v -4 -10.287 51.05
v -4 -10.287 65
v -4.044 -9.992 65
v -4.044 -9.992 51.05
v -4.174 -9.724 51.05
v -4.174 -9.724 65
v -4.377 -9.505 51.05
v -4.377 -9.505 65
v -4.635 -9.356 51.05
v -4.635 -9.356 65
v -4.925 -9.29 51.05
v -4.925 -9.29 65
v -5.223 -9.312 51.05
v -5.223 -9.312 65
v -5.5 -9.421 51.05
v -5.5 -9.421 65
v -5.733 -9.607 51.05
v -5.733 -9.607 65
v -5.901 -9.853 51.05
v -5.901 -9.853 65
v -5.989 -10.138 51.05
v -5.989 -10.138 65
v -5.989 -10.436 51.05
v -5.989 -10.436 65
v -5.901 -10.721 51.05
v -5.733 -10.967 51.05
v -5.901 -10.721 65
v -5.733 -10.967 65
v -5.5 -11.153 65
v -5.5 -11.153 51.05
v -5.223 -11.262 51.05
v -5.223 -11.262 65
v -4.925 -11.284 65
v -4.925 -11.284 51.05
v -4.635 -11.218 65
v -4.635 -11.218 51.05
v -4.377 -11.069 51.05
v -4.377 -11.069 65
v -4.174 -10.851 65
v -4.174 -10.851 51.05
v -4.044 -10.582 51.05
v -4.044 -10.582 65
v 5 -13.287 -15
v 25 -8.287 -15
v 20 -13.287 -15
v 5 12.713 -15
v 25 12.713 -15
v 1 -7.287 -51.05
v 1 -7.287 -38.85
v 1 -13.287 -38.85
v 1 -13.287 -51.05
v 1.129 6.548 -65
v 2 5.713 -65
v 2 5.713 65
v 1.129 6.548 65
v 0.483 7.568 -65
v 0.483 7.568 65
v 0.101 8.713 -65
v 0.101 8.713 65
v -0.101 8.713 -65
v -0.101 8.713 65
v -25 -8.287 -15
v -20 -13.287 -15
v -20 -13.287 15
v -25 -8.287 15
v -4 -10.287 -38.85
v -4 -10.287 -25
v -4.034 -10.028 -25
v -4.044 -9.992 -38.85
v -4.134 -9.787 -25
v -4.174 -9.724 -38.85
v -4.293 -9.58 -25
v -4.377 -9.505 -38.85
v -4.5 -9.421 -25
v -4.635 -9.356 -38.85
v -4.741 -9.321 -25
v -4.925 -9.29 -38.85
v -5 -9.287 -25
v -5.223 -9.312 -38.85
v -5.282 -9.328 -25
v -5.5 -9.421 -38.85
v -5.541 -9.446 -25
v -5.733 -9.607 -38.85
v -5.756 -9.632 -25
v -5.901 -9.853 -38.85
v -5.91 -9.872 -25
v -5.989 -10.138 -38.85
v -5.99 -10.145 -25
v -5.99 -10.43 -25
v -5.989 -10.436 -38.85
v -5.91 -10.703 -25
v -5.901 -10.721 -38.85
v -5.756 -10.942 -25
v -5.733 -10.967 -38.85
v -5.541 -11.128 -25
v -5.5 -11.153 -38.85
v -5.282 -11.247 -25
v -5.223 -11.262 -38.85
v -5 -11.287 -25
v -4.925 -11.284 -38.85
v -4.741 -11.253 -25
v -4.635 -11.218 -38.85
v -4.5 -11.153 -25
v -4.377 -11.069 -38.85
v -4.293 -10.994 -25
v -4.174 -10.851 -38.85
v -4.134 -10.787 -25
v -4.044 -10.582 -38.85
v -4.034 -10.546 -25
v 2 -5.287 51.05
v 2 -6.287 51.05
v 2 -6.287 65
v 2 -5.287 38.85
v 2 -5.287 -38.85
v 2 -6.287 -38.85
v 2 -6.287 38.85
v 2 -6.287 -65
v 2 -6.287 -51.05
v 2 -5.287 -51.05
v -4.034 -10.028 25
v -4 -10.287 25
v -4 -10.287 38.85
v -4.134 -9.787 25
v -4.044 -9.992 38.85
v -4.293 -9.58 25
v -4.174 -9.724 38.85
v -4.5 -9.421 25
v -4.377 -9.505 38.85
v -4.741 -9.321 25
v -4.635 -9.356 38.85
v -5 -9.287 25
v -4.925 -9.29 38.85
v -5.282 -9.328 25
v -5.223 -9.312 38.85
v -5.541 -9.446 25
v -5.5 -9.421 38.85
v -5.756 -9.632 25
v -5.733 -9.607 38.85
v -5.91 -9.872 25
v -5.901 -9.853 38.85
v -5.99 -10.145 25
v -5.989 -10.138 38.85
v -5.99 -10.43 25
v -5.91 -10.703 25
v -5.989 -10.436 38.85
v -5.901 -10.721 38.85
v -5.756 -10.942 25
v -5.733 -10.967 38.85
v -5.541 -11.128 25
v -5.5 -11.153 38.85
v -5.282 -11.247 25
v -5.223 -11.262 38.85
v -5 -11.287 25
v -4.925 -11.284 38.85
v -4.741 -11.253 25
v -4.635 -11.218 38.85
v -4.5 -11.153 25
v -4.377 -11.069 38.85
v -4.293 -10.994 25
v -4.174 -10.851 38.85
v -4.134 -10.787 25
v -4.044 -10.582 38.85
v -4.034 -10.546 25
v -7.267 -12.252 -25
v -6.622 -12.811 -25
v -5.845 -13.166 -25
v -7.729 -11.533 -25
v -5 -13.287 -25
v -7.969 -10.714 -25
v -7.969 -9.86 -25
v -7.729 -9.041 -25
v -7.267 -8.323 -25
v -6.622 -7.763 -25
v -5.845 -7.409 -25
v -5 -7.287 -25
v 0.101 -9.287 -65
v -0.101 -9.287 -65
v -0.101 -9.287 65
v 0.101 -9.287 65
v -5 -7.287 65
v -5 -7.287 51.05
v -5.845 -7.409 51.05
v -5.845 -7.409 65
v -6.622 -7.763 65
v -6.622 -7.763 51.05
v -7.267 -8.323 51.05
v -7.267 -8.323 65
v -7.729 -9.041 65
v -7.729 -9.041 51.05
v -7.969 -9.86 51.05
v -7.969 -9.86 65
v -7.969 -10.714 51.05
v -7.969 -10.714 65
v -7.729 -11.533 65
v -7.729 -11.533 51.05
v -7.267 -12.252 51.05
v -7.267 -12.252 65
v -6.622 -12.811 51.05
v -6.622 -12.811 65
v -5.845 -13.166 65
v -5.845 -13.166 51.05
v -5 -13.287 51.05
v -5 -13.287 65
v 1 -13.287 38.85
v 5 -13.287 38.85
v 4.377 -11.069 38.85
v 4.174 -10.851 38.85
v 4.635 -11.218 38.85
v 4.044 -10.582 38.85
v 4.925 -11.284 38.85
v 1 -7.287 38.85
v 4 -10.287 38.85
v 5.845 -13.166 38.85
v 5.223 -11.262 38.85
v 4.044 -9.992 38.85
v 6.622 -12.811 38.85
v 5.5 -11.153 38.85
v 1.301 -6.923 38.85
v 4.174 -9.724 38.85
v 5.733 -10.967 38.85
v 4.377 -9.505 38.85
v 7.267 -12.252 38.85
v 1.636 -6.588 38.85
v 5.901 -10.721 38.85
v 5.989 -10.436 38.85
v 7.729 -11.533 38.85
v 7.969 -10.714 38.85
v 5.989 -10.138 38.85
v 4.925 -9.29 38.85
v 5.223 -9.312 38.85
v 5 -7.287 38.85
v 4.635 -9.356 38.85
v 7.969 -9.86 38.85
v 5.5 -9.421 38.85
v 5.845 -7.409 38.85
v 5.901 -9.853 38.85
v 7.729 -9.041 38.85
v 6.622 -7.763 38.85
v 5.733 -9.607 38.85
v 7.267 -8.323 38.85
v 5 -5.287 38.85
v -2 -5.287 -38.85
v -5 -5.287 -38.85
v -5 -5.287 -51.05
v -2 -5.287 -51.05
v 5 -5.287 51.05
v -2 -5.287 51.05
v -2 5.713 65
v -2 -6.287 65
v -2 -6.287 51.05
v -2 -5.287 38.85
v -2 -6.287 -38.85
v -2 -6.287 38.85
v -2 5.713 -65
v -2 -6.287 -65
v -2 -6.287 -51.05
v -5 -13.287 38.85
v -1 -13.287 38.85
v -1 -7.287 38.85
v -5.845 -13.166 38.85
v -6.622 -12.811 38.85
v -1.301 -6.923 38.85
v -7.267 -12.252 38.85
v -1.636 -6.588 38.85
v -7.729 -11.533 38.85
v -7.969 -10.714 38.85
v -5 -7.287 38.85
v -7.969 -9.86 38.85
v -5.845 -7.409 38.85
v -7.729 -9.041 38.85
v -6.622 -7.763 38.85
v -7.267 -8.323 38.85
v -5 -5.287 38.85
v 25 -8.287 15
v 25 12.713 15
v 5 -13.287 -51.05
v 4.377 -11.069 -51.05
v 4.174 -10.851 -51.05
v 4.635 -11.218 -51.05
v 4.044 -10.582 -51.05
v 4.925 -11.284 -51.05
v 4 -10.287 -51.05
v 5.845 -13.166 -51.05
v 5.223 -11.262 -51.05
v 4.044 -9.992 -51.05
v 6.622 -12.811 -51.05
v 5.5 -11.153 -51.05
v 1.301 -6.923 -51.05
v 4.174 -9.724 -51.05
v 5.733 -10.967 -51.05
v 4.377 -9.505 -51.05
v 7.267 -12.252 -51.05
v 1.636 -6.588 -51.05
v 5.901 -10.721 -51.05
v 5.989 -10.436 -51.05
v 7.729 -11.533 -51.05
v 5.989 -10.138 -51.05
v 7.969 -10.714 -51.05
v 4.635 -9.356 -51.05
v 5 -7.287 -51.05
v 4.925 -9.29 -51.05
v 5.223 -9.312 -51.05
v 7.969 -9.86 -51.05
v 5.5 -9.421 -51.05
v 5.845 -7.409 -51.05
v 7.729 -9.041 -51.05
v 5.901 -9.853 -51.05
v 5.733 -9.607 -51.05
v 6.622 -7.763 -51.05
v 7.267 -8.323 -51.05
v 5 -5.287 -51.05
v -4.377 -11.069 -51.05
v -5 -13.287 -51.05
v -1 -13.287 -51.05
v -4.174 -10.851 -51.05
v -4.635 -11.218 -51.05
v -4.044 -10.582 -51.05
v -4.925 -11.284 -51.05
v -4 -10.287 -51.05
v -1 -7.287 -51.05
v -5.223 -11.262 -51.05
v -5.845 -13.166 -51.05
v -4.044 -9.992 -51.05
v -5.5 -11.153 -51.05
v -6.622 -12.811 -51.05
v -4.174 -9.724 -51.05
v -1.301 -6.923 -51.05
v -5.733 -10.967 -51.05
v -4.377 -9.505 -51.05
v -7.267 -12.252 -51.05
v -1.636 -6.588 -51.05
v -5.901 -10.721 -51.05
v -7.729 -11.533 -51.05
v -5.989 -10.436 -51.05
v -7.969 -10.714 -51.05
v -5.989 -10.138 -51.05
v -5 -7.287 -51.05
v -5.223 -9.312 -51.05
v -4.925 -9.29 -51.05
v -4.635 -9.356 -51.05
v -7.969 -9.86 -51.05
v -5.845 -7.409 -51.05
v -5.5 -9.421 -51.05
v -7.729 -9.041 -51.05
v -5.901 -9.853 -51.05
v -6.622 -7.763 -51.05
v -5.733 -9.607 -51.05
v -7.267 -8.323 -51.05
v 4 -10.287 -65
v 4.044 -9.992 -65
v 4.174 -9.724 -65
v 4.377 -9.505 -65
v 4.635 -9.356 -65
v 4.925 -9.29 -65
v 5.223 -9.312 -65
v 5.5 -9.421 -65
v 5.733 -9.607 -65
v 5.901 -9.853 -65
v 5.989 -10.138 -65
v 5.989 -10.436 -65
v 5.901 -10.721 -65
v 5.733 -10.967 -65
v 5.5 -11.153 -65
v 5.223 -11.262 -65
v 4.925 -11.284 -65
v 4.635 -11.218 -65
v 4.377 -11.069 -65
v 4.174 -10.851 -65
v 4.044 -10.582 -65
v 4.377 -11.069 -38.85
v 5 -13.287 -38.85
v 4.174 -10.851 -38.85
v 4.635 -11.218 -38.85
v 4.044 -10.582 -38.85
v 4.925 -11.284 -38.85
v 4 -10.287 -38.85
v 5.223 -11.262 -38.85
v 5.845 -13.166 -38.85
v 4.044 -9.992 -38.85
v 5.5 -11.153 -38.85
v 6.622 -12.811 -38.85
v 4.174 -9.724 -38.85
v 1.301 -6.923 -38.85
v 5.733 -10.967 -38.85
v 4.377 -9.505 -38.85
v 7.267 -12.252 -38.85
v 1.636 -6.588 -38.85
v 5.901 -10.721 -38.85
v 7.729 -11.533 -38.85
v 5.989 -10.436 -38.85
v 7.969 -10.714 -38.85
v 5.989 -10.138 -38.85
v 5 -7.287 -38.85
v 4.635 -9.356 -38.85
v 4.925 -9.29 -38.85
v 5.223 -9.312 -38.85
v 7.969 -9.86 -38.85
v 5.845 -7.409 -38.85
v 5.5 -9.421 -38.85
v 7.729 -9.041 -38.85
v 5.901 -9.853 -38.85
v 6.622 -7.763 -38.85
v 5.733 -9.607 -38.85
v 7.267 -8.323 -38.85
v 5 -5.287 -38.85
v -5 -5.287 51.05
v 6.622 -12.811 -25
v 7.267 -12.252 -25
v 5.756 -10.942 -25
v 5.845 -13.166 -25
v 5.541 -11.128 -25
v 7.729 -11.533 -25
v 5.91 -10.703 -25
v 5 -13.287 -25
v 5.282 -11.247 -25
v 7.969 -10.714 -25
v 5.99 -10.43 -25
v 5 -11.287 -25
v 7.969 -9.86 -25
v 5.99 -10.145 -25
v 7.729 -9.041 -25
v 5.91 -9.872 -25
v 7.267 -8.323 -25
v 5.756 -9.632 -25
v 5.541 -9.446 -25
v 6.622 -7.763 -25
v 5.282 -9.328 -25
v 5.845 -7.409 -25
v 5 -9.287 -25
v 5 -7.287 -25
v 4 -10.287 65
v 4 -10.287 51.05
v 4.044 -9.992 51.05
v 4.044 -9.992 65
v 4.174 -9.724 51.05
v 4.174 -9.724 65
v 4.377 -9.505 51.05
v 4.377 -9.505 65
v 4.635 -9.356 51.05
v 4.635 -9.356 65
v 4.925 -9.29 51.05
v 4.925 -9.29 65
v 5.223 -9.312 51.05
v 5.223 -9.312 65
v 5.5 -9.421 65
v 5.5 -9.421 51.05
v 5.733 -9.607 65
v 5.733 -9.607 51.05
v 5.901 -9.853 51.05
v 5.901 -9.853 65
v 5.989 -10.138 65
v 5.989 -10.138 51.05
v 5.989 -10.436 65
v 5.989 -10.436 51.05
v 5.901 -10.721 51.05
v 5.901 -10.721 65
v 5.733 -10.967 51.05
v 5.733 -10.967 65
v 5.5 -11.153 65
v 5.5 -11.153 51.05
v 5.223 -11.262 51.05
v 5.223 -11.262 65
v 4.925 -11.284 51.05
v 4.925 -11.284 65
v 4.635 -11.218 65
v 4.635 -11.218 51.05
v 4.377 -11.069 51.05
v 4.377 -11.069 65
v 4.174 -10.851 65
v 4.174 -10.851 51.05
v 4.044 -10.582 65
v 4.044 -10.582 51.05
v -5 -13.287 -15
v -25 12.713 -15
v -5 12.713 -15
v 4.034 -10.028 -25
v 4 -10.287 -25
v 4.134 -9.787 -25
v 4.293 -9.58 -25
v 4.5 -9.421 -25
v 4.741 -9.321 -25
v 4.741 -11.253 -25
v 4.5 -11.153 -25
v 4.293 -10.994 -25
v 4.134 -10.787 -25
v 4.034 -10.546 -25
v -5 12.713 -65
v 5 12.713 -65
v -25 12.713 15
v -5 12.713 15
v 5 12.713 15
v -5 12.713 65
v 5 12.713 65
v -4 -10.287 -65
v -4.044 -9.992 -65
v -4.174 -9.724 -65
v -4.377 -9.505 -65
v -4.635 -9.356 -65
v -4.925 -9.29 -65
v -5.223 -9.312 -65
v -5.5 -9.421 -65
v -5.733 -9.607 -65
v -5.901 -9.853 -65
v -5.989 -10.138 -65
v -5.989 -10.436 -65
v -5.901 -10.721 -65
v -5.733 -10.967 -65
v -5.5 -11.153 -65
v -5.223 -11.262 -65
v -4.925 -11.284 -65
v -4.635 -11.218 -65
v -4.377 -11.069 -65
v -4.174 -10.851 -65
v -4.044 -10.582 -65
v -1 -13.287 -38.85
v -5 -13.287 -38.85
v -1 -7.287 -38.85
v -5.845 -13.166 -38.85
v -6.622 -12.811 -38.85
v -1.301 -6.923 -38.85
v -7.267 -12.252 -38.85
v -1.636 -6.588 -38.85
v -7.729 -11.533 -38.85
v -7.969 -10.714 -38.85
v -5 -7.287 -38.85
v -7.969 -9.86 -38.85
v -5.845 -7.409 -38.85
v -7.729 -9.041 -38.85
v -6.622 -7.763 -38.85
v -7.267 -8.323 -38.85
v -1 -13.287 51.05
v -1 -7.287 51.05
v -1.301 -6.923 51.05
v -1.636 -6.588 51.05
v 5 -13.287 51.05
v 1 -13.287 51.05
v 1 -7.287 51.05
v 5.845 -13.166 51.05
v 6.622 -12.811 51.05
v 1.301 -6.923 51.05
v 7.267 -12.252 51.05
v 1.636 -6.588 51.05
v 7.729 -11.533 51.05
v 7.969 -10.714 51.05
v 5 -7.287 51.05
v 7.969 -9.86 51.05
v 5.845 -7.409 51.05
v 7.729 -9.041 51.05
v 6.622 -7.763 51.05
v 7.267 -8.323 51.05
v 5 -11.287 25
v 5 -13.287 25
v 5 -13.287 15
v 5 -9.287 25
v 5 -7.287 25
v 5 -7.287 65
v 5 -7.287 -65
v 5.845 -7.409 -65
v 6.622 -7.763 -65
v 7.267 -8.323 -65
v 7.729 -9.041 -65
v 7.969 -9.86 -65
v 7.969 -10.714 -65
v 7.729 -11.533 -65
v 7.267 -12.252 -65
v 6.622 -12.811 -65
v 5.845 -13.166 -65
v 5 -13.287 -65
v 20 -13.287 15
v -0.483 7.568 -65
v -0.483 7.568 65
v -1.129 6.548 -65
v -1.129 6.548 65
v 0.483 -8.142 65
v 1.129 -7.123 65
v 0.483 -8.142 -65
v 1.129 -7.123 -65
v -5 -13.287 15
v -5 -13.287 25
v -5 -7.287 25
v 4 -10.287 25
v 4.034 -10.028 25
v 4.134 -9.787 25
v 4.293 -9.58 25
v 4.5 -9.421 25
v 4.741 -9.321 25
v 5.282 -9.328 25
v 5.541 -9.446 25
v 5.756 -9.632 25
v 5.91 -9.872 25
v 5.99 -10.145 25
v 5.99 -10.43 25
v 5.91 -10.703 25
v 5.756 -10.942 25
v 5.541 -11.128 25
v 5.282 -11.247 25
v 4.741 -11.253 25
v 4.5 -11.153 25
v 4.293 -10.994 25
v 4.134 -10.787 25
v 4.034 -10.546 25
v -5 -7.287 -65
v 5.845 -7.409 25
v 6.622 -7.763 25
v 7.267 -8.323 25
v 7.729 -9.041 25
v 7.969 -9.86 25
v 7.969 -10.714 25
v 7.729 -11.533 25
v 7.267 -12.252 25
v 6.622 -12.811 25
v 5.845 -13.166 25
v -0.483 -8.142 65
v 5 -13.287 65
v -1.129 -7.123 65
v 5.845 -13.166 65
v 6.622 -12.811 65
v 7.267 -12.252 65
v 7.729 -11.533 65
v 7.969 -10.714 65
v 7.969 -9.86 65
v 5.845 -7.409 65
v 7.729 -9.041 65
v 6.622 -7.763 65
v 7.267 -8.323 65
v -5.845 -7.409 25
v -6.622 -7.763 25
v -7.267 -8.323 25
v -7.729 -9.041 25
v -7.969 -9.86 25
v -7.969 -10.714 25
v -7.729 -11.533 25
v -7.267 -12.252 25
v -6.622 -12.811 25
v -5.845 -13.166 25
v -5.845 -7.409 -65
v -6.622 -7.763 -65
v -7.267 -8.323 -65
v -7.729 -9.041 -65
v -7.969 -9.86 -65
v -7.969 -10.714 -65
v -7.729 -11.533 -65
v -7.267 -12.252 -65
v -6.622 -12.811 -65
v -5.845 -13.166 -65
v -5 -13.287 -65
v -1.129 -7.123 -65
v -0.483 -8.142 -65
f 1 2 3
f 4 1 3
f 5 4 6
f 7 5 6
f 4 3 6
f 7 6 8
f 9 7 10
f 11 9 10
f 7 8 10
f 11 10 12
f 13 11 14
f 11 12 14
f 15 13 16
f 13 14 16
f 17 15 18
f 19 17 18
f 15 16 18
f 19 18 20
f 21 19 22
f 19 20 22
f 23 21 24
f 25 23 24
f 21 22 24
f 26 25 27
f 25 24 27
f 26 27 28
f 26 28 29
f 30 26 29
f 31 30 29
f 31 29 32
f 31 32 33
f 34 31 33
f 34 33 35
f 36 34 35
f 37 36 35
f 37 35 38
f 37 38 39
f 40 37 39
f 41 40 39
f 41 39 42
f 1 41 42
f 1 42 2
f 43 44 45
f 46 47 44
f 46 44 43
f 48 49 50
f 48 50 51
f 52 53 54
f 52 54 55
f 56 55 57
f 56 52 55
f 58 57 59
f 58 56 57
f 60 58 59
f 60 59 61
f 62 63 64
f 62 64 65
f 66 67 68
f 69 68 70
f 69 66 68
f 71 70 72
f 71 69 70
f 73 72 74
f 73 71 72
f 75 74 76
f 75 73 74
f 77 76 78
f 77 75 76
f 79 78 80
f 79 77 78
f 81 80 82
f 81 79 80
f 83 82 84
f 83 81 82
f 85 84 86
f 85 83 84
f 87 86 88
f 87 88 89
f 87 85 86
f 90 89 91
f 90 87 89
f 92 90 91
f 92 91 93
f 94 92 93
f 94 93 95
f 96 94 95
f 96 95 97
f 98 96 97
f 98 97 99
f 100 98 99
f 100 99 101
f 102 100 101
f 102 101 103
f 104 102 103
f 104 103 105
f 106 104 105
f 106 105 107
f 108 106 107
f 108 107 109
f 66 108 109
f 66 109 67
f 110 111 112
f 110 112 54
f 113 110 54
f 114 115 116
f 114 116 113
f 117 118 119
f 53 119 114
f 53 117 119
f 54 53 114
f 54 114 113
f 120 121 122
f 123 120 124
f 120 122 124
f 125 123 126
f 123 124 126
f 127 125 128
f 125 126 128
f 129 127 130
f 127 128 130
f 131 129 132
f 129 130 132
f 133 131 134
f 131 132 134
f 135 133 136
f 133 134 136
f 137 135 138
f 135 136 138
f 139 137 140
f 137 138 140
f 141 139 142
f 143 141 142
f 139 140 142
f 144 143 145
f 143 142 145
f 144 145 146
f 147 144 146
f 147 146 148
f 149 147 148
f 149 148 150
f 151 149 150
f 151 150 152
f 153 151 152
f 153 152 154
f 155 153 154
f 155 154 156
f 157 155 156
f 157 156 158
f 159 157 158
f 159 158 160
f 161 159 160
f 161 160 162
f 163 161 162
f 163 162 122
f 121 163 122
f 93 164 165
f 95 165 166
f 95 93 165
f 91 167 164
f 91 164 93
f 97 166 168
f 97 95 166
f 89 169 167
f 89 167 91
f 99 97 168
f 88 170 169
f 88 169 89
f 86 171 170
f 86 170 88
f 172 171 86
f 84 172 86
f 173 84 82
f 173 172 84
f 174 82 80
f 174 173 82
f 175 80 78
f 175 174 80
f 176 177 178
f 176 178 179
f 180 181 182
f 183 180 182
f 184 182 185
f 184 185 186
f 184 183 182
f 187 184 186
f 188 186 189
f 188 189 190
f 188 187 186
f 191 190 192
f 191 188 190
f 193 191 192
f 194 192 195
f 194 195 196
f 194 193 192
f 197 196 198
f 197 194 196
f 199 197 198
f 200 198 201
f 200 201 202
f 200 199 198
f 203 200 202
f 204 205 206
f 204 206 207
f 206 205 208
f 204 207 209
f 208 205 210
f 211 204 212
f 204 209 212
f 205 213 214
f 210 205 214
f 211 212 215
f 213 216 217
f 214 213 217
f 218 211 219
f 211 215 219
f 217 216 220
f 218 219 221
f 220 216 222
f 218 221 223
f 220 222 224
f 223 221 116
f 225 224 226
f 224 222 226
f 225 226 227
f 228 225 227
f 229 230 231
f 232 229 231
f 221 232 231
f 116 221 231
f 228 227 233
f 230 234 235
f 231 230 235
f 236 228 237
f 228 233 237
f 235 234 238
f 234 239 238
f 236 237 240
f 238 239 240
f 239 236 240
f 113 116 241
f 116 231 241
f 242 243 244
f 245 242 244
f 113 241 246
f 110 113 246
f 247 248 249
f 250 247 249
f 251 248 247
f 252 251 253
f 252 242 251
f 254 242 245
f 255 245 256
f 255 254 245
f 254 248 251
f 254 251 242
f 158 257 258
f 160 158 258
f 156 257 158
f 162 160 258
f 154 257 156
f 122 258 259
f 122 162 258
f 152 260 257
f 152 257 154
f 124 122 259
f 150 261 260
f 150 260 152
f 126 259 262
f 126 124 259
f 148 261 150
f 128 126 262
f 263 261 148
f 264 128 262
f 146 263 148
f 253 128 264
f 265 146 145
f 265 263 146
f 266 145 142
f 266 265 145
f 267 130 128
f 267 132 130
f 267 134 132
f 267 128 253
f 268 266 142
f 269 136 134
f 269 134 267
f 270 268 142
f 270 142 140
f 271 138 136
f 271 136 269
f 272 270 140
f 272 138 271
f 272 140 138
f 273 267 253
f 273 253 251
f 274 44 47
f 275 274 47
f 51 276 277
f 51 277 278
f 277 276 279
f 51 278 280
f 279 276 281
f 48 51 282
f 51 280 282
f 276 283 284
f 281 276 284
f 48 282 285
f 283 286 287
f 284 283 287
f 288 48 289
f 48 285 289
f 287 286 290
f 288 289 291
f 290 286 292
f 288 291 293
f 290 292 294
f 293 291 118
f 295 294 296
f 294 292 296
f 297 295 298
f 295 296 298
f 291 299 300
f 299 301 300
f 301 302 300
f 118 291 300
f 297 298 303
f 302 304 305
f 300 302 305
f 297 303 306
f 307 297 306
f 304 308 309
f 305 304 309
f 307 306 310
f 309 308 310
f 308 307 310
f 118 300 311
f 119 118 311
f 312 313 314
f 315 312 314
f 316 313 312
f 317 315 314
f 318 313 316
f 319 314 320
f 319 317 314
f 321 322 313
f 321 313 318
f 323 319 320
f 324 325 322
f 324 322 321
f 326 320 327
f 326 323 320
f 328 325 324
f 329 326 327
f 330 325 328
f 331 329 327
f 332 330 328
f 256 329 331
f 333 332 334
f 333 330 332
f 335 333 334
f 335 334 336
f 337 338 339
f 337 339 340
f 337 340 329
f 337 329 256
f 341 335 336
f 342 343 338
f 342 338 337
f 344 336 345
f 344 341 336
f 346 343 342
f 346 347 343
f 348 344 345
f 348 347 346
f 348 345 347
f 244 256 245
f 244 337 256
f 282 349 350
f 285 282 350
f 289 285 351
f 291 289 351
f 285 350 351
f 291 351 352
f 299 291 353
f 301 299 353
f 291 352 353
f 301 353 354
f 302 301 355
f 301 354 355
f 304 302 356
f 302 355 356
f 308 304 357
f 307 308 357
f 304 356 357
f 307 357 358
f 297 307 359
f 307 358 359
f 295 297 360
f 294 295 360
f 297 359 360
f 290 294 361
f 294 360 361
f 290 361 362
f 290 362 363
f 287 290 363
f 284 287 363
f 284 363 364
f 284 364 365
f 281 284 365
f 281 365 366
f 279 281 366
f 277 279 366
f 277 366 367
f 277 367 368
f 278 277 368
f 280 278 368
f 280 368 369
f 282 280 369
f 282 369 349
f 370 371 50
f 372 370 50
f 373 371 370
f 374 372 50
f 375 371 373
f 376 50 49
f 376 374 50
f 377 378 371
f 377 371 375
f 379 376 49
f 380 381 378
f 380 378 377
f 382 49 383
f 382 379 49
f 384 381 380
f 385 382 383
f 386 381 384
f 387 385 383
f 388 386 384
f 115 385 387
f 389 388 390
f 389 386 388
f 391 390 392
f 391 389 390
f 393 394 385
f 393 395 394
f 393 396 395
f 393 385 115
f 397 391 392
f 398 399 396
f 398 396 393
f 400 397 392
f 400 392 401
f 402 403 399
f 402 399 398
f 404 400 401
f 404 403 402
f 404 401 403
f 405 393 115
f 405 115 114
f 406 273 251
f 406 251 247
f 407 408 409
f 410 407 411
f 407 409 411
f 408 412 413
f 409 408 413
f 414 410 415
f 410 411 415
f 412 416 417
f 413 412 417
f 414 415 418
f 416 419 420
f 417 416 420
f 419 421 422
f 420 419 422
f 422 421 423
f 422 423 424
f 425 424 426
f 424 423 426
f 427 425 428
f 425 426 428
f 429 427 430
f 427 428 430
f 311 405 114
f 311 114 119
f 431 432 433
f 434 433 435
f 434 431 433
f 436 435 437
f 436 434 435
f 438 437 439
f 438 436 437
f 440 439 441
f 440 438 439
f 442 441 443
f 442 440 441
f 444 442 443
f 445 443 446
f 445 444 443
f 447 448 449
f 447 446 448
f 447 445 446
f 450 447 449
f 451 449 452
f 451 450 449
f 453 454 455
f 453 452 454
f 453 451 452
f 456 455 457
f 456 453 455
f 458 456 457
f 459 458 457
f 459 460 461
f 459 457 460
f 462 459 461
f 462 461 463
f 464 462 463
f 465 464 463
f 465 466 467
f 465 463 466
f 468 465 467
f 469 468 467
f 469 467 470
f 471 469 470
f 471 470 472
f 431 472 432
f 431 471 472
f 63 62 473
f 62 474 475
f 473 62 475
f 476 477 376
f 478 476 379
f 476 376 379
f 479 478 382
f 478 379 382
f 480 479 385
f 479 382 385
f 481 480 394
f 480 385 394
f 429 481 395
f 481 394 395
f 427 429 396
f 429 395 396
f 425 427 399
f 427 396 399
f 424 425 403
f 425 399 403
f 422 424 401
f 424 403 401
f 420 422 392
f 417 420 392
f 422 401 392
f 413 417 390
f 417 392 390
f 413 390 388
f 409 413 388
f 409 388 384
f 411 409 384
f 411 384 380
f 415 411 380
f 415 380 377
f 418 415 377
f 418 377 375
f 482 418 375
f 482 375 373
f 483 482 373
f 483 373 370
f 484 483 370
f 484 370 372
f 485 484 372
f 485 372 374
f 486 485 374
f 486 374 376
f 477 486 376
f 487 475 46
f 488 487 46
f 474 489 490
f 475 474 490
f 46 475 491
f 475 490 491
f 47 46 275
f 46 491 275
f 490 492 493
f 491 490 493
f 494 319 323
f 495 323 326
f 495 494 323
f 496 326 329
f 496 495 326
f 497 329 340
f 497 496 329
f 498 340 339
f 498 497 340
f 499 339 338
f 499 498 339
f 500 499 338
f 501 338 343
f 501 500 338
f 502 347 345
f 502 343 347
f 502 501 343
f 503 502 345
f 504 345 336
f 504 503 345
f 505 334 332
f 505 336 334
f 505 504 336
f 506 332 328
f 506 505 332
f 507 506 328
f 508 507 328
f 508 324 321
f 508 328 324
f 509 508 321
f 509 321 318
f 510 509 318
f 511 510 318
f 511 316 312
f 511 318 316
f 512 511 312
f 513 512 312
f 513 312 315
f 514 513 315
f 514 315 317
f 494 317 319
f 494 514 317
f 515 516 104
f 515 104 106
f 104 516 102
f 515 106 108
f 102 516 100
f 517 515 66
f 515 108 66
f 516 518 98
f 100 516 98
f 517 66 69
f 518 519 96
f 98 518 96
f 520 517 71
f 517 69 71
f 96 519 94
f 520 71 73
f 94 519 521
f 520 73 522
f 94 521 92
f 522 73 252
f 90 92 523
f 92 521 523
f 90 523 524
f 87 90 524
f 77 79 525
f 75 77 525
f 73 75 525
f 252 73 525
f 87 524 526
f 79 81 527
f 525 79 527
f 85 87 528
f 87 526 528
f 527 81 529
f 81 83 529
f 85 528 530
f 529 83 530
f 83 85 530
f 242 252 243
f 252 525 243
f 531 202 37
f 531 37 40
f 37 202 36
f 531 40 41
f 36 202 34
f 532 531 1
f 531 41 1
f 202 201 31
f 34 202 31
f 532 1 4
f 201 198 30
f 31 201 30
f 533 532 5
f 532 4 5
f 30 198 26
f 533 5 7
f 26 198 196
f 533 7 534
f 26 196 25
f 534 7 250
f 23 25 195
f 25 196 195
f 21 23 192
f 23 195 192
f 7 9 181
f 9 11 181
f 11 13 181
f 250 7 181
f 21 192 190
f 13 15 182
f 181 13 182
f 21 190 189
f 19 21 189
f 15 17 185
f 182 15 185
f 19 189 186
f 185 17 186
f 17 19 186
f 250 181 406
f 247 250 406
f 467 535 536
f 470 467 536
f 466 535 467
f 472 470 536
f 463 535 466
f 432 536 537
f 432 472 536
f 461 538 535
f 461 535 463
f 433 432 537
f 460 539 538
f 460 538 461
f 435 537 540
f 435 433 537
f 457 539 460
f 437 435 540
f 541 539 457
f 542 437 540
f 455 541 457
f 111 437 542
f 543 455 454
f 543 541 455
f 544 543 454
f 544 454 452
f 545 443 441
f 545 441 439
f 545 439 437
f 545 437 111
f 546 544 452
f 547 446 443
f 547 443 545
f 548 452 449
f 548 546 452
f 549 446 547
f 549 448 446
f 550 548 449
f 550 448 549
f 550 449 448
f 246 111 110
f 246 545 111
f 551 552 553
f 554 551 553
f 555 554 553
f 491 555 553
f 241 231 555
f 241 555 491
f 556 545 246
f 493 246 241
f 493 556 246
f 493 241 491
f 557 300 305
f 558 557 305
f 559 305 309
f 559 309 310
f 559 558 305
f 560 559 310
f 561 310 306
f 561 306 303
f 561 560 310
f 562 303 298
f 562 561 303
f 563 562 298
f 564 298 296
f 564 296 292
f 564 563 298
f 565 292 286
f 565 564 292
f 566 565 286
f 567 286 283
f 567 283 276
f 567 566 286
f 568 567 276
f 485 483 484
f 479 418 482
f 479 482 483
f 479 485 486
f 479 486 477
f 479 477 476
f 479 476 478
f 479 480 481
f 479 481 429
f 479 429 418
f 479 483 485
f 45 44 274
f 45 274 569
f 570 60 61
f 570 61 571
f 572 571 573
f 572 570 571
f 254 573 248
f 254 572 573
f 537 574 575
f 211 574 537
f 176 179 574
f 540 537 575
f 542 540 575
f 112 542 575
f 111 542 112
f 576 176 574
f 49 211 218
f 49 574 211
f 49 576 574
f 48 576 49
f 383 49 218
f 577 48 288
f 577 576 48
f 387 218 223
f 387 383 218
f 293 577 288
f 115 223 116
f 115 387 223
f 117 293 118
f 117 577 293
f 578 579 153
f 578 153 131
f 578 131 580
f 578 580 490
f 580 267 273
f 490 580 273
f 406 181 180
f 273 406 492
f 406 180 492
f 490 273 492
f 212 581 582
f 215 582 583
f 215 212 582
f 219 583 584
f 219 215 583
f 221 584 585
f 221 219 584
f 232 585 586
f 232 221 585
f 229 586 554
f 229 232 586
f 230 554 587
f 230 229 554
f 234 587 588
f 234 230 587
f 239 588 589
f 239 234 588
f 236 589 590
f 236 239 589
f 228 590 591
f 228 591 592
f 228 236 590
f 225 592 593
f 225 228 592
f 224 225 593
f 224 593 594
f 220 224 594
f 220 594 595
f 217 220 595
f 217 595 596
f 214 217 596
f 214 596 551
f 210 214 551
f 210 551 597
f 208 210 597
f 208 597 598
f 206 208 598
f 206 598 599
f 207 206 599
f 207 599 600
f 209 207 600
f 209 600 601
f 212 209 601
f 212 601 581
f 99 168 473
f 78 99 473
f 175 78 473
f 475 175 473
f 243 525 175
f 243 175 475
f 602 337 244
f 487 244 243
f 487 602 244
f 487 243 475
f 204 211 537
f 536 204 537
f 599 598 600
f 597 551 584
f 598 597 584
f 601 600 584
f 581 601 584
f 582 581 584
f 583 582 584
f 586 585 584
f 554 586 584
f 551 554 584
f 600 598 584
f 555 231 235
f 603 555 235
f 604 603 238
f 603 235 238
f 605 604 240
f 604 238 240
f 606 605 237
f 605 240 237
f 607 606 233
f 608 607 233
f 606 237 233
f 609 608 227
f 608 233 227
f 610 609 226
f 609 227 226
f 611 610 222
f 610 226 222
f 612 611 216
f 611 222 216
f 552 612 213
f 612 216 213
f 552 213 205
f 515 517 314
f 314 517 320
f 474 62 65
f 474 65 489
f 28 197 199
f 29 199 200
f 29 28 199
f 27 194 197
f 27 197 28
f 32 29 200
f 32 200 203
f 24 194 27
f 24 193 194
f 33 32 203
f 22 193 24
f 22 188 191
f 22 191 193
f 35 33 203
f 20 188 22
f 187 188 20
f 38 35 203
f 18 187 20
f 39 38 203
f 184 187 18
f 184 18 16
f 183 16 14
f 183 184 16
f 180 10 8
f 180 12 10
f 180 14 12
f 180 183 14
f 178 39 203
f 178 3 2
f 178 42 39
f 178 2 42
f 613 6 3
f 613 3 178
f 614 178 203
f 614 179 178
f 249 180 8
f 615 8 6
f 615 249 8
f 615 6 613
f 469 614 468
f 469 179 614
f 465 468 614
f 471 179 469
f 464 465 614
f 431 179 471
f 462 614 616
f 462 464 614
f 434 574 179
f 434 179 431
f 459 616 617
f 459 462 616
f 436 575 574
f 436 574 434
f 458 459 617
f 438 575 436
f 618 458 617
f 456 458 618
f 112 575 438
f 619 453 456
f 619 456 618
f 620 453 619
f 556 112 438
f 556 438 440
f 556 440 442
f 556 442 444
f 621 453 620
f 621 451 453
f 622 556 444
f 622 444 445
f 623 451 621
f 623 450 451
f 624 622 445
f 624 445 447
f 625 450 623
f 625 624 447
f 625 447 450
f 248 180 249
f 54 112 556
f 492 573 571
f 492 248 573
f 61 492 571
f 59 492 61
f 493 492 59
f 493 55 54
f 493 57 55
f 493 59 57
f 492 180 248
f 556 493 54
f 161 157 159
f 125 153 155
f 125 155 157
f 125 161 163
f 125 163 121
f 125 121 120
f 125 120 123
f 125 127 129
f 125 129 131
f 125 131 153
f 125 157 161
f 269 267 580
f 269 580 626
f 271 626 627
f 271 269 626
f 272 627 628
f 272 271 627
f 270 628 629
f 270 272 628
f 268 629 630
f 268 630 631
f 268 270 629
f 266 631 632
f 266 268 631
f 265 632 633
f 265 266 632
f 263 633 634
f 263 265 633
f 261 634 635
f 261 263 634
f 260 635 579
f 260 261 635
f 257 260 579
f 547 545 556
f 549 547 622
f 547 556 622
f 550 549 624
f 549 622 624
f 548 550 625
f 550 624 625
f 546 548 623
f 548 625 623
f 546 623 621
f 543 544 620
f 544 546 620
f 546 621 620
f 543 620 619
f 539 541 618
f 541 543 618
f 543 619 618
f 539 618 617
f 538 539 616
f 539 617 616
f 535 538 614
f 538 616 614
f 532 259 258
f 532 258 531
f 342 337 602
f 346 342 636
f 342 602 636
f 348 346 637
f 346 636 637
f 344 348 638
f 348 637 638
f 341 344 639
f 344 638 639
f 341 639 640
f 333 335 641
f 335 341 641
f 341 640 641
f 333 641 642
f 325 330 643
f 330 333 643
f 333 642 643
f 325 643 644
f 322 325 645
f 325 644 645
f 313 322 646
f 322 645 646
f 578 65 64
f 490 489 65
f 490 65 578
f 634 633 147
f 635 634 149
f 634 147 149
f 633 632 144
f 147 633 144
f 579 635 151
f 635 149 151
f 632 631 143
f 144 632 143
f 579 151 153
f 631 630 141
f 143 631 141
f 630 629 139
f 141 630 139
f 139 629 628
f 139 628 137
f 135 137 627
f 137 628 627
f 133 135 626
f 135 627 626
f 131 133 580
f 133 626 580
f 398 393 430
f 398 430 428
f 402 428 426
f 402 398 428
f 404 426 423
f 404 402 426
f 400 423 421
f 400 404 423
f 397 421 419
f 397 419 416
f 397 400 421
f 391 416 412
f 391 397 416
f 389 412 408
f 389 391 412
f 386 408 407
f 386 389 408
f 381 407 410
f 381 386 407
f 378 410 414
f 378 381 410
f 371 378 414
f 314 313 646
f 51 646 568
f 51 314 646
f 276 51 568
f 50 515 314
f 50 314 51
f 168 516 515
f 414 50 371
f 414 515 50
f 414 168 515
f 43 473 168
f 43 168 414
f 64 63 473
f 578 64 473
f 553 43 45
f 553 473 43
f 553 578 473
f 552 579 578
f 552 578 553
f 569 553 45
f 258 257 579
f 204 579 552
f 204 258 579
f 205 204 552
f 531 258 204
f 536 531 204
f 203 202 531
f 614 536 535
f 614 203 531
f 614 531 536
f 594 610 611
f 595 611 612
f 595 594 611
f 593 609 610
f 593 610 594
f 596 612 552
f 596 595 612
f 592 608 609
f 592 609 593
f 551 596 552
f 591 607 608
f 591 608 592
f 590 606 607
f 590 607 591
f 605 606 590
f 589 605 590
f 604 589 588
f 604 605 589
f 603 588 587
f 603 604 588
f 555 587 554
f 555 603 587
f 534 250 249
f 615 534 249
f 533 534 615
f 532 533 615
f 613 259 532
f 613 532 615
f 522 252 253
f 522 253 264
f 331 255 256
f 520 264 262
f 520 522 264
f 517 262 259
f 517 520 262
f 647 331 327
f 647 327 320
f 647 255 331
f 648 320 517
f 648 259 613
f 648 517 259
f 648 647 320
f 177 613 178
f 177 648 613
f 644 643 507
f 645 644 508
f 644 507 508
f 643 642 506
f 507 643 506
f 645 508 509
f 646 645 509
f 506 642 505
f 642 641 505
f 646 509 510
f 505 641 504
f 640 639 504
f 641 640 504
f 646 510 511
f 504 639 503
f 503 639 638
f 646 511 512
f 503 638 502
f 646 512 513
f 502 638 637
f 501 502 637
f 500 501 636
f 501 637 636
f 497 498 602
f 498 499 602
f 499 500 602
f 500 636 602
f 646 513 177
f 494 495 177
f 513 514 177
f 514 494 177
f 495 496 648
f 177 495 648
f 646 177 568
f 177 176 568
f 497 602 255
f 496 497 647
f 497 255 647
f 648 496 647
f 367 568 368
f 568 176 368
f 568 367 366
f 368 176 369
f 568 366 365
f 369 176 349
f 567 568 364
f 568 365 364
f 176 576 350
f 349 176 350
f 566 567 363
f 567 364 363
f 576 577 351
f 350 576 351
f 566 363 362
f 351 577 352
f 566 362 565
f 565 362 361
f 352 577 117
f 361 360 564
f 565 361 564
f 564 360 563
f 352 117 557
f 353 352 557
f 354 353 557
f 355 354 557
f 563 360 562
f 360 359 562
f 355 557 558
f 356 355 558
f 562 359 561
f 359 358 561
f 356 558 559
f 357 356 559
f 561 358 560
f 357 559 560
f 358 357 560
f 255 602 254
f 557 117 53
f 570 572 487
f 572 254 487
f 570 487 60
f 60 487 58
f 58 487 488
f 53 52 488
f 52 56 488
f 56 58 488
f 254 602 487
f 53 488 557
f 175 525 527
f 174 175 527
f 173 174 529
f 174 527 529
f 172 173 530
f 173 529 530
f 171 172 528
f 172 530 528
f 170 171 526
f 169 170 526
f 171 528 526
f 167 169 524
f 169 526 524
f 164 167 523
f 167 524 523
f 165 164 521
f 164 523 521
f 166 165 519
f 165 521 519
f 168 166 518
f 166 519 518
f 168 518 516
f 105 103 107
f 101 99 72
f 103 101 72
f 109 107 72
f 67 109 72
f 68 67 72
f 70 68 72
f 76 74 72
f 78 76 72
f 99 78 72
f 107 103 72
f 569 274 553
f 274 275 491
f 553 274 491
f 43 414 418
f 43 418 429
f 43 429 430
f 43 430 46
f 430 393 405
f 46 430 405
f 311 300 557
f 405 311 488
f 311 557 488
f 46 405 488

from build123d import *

# Parameters (mm, degrees)
SKETCH_1_W               = 50
SKETCH_1_H               = 26
EXTRUDE_1_DEPTH          = 65
SKETCH_7_W               = 20
SKETCH_7_H               = 26
CUT_EXTRUDE_5_DEPTH      = 50
SKETCH_4_R               = 3
EXTRUDE_3_DEPTH          = 40
SKETCH_5_W               = 12.2
SKETCH_5_H               = 8
CUT_EXTRUDE_3_DEPTH      = 4
SKETCH_6_R               = 1
CUT_EXTRUDE_4_DEPTH      = 40
MIRROR_2_COPY_1_SKETCH_W = 20
MIRROR_2_COPY_1_SKETCH_H = 26
MIRROR_2_COPY_1_DEPTH    = 50
MIRROR_2_COPY_2_SKETCH_R = 3
MIRROR_2_COPY_2_DEPTH    = 40
MIRROR_2_COPY_3_SKETCH_W = 12.2
MIRROR_2_COPY_3_SKETCH_H = 8
MIRROR_2_COPY_3_DEPTH    = 4
MIRROR_2_COPY_4_SKETCH_R = 1
MIRROR_2_COPY_4_DEPTH    = 40
CUT_EXTRUDE_7_DEPTH      = 71.89816586
CUT_EXTRUDE_7_DEPTH_BACK = 71.89816586
CUT_EXTRUDE_8_REACH      = 86.862


with BuildPart() as part:
    # Эскиз1 → Бобышка-Вытянуть1 (new, symmetric)
    with BuildSketch(Plane.XY):
        with Locations((0, -0.287208972)):
            Rectangle(SKETCH_1_W, SKETCH_1_H)
    extrude(amount=EXTRUDE_1_DEPTH, both=True)

    # Эскиз7 → Вырез-Вытянуть5 (cut)
    with BuildSketch(Plane.XY.offset(65)):
        with Locations((-15, -0.287208972)):
            Rectangle(SKETCH_7_W, SKETCH_7_H)
    cut_extrude_5 = extrude(amount=-CUT_EXTRUDE_5_DEPTH, mode=Mode.SUBTRACT)

    # Эскиз4 → Бобышка-Вытянуть3 (add)
    with BuildSketch(Plane.XY.offset(65)):
        with Locations((-5, -10.287208972)):
            Circle(SKETCH_4_R)
    extrude_3 = extrude(amount=-EXTRUDE_3_DEPTH)

    # Эскиз5 → Вырез-Вытянуть3 (cut, symmetric)
    with BuildSketch(Plane.ZY.offset(5)):
        with Locations((44.95, -9.287208972)):
            Rectangle(SKETCH_5_W, SKETCH_5_H)
    cut_extrude_3 = extrude(amount=CUT_EXTRUDE_3_DEPTH, both=True, mode=Mode.SUBTRACT)

    # Эскиз6 → Вырез-Вытянуть4 (cut)
    with BuildSketch(Plane.XY.offset(65)):
        with Locations((-5, -10.287208972)):
            Circle(SKETCH_6_R)
    cut_extrude_4 = extrude(amount=-CUT_EXTRUDE_4_DEPTH, mode=Mode.SUBTRACT)

    # Зеркальное отражение1: Вырез-Вытянуть5, Бобышка-Вытянуть3, Вырез-Вытянуть3, Вырез-Вытянуть4 across plane
    add(cut_extrude_5.mirror(Plane.XY), mode=Mode.SUBTRACT)
    add(extrude_3.mirror(Plane.XY))
    add(cut_extrude_3.mirror(Plane.XY), mode=Mode.SUBTRACT)
    add(cut_extrude_4.mirror(Plane.XY), mode=Mode.SUBTRACT)

    # Зеркальное отражение2: Вырез-Вытянуть5, Бобышка-Вытянуть3, Вырез-Вытянуть3, Вырез-Вытянуть4 across plane
    add(cut_extrude_5.mirror(Plane(origin=(0, 0, 0), x_dir=(0, 0, 1), z_dir=(1, 0, 0))), mode=Mode.SUBTRACT)
    add(extrude_3.mirror(Plane(origin=(0, 0, 0), x_dir=(0, 0, 1), z_dir=(1, 0, 0))))
    add(cut_extrude_3.mirror(Plane(origin=(0, 0, 0), x_dir=(0, 0, 1), z_dir=(1, 0, 0))), mode=Mode.SUBTRACT)
    add(cut_extrude_4.mirror(Plane(origin=(0, 0, 0), x_dir=(0, 0, 1), z_dir=(1, 0, 0))), mode=Mode.SUBTRACT)

    # Зеркальное отражение2 copy 1 sketch → Зеркальное отражение2 copy 1 (cut)
    with BuildSketch(Plane(origin=(0, 0, -65), x_dir=(-1, 0, 0), z_dir=(0, 0, -1))):
        with Locations((-15, -0.287208972)):
            Rectangle(MIRROR_2_COPY_1_SKETCH_W, MIRROR_2_COPY_1_SKETCH_H)
    extrude(amount=-MIRROR_2_COPY_1_DEPTH, mode=Mode.SUBTRACT)

    # Зеркальное отражение2 copy 2 sketch → Зеркальное отражение2 copy 2 (add)
    with BuildSketch(Plane(origin=(0, 0, -65), x_dir=(-1, 0, 0), z_dir=(0, 0, -1))):
        with Locations((-5, -10.287208972)):
            Circle(MIRROR_2_COPY_2_SKETCH_R)
    extrude(amount=-MIRROR_2_COPY_2_DEPTH)

    # Зеркальное отражение2 copy 3 sketch → Зеркальное отражение2 copy 3 (cut, symmetric)
    with BuildSketch(Plane(origin=(5, 0, 0), x_dir=(0, 0, -1), z_dir=(1, 0, 0))):
        with Locations((44.95, -9.287208972)):
            Rectangle(MIRROR_2_COPY_3_SKETCH_W, MIRROR_2_COPY_3_SKETCH_H)
    extrude(amount=MIRROR_2_COPY_3_DEPTH, both=True, mode=Mode.SUBTRACT)

    # Зеркальное отражение2 copy 4 sketch → Зеркальное отражение2 copy 4 (cut)
    with BuildSketch(Plane(origin=(0, 0, -65), x_dir=(-1, 0, 0), z_dir=(0, 0, -1))):
        with Locations((-5, -10.287208972)):
            Circle(MIRROR_2_COPY_4_SKETCH_R)
    extrude(amount=-MIRROR_2_COPY_4_DEPTH, mode=Mode.SUBTRACT)

    # Эскиз9 → Вырез-Вытянуть7 (cut, two sides: drawn at the far end of the back side and taken through both)
    with BuildSketch(Plane.XY.offset(-CUT_EXTRUDE_7_DEPTH_BACK)):
        with BuildLine():
            Line((0, -9.287208972), (0, 8.712791028))
            Line((0, 8.712791028), (-0.101020514, 8.712791028))
            ThreePointArc((-0.101020514, 8.712791028), (-0.775255129, 7.038556414), (-2, 5.712791028))
            Line((-2, 5.712791028), (-2, -6.287208972))
            ThreePointArc((-2, -6.287208972), (-0.775255129, -7.612974358), (-0.101020514, -9.287208972))
            Line((-0.101020514, -9.287208972), (0, -9.287208972))
        make_face()
        with BuildLine():
            Line((0.101020514, 8.712791028), (0, 8.712791028))
            Line((0, 8.712791028), (0, -9.287208972))
            Line((0, -9.287208972), (0.101020514, -9.287208972))
            ThreePointArc((0.101020514, -9.287208972), (0.775255129, -7.612974358), (2, -6.287208972))
            Line((2, -6.287208972), (2, 5.712791028))
            ThreePointArc((2, 5.712791028), (0.775255129, 7.038556414), (0.101020514, 8.712791028))
        make_face()
    extrude(amount=CUT_EXTRUDE_7_DEPTH + CUT_EXTRUDE_7_DEPTH_BACK, mode=Mode.SUBTRACT)

    # Эскиз10 → Вырез-Вытянуть8 (cut, up to next)
    with BuildSketch(Plane.XY.offset(15), mode=Mode.PRIVATE) as cut_extrude_8_sk1:
        Polygon((-20, -13.287208972), (-25, -8.287208972), (-25, -13.287208972), align=None)
    cut_extrude_8_tool1 = extrude(cut_extrude_8_sk1.sketch, amount=-CUT_EXTRUDE_8_REACH, mode=Mode.PRIVATE) & part.part
    # Эскиз10 → Вырез-Вытянуть8 (cut, up to next)
    with BuildSketch(Plane.XY.offset(15), mode=Mode.PRIVATE) as cut_extrude_8_sk2:
        Polygon((20, -13.287208972), (25, -13.287208972), (25, -8.287208972), align=None)
    cut_extrude_8_tool2 = extrude(cut_extrude_8_sk2.sketch, amount=-CUT_EXTRUDE_8_REACH, mode=Mode.PRIVATE) & part.part
    add(cut_extrude_8_tool1.solids().sort_by_distance((-23.333333, -11.620542, 15))[0], mode=Mode.SUBTRACT)
    add(cut_extrude_8_tool2.solids().sort_by_distance((23.333333, -11.620542, 15))[0], mode=Mode.SUBTRACT)


solid = part.part
